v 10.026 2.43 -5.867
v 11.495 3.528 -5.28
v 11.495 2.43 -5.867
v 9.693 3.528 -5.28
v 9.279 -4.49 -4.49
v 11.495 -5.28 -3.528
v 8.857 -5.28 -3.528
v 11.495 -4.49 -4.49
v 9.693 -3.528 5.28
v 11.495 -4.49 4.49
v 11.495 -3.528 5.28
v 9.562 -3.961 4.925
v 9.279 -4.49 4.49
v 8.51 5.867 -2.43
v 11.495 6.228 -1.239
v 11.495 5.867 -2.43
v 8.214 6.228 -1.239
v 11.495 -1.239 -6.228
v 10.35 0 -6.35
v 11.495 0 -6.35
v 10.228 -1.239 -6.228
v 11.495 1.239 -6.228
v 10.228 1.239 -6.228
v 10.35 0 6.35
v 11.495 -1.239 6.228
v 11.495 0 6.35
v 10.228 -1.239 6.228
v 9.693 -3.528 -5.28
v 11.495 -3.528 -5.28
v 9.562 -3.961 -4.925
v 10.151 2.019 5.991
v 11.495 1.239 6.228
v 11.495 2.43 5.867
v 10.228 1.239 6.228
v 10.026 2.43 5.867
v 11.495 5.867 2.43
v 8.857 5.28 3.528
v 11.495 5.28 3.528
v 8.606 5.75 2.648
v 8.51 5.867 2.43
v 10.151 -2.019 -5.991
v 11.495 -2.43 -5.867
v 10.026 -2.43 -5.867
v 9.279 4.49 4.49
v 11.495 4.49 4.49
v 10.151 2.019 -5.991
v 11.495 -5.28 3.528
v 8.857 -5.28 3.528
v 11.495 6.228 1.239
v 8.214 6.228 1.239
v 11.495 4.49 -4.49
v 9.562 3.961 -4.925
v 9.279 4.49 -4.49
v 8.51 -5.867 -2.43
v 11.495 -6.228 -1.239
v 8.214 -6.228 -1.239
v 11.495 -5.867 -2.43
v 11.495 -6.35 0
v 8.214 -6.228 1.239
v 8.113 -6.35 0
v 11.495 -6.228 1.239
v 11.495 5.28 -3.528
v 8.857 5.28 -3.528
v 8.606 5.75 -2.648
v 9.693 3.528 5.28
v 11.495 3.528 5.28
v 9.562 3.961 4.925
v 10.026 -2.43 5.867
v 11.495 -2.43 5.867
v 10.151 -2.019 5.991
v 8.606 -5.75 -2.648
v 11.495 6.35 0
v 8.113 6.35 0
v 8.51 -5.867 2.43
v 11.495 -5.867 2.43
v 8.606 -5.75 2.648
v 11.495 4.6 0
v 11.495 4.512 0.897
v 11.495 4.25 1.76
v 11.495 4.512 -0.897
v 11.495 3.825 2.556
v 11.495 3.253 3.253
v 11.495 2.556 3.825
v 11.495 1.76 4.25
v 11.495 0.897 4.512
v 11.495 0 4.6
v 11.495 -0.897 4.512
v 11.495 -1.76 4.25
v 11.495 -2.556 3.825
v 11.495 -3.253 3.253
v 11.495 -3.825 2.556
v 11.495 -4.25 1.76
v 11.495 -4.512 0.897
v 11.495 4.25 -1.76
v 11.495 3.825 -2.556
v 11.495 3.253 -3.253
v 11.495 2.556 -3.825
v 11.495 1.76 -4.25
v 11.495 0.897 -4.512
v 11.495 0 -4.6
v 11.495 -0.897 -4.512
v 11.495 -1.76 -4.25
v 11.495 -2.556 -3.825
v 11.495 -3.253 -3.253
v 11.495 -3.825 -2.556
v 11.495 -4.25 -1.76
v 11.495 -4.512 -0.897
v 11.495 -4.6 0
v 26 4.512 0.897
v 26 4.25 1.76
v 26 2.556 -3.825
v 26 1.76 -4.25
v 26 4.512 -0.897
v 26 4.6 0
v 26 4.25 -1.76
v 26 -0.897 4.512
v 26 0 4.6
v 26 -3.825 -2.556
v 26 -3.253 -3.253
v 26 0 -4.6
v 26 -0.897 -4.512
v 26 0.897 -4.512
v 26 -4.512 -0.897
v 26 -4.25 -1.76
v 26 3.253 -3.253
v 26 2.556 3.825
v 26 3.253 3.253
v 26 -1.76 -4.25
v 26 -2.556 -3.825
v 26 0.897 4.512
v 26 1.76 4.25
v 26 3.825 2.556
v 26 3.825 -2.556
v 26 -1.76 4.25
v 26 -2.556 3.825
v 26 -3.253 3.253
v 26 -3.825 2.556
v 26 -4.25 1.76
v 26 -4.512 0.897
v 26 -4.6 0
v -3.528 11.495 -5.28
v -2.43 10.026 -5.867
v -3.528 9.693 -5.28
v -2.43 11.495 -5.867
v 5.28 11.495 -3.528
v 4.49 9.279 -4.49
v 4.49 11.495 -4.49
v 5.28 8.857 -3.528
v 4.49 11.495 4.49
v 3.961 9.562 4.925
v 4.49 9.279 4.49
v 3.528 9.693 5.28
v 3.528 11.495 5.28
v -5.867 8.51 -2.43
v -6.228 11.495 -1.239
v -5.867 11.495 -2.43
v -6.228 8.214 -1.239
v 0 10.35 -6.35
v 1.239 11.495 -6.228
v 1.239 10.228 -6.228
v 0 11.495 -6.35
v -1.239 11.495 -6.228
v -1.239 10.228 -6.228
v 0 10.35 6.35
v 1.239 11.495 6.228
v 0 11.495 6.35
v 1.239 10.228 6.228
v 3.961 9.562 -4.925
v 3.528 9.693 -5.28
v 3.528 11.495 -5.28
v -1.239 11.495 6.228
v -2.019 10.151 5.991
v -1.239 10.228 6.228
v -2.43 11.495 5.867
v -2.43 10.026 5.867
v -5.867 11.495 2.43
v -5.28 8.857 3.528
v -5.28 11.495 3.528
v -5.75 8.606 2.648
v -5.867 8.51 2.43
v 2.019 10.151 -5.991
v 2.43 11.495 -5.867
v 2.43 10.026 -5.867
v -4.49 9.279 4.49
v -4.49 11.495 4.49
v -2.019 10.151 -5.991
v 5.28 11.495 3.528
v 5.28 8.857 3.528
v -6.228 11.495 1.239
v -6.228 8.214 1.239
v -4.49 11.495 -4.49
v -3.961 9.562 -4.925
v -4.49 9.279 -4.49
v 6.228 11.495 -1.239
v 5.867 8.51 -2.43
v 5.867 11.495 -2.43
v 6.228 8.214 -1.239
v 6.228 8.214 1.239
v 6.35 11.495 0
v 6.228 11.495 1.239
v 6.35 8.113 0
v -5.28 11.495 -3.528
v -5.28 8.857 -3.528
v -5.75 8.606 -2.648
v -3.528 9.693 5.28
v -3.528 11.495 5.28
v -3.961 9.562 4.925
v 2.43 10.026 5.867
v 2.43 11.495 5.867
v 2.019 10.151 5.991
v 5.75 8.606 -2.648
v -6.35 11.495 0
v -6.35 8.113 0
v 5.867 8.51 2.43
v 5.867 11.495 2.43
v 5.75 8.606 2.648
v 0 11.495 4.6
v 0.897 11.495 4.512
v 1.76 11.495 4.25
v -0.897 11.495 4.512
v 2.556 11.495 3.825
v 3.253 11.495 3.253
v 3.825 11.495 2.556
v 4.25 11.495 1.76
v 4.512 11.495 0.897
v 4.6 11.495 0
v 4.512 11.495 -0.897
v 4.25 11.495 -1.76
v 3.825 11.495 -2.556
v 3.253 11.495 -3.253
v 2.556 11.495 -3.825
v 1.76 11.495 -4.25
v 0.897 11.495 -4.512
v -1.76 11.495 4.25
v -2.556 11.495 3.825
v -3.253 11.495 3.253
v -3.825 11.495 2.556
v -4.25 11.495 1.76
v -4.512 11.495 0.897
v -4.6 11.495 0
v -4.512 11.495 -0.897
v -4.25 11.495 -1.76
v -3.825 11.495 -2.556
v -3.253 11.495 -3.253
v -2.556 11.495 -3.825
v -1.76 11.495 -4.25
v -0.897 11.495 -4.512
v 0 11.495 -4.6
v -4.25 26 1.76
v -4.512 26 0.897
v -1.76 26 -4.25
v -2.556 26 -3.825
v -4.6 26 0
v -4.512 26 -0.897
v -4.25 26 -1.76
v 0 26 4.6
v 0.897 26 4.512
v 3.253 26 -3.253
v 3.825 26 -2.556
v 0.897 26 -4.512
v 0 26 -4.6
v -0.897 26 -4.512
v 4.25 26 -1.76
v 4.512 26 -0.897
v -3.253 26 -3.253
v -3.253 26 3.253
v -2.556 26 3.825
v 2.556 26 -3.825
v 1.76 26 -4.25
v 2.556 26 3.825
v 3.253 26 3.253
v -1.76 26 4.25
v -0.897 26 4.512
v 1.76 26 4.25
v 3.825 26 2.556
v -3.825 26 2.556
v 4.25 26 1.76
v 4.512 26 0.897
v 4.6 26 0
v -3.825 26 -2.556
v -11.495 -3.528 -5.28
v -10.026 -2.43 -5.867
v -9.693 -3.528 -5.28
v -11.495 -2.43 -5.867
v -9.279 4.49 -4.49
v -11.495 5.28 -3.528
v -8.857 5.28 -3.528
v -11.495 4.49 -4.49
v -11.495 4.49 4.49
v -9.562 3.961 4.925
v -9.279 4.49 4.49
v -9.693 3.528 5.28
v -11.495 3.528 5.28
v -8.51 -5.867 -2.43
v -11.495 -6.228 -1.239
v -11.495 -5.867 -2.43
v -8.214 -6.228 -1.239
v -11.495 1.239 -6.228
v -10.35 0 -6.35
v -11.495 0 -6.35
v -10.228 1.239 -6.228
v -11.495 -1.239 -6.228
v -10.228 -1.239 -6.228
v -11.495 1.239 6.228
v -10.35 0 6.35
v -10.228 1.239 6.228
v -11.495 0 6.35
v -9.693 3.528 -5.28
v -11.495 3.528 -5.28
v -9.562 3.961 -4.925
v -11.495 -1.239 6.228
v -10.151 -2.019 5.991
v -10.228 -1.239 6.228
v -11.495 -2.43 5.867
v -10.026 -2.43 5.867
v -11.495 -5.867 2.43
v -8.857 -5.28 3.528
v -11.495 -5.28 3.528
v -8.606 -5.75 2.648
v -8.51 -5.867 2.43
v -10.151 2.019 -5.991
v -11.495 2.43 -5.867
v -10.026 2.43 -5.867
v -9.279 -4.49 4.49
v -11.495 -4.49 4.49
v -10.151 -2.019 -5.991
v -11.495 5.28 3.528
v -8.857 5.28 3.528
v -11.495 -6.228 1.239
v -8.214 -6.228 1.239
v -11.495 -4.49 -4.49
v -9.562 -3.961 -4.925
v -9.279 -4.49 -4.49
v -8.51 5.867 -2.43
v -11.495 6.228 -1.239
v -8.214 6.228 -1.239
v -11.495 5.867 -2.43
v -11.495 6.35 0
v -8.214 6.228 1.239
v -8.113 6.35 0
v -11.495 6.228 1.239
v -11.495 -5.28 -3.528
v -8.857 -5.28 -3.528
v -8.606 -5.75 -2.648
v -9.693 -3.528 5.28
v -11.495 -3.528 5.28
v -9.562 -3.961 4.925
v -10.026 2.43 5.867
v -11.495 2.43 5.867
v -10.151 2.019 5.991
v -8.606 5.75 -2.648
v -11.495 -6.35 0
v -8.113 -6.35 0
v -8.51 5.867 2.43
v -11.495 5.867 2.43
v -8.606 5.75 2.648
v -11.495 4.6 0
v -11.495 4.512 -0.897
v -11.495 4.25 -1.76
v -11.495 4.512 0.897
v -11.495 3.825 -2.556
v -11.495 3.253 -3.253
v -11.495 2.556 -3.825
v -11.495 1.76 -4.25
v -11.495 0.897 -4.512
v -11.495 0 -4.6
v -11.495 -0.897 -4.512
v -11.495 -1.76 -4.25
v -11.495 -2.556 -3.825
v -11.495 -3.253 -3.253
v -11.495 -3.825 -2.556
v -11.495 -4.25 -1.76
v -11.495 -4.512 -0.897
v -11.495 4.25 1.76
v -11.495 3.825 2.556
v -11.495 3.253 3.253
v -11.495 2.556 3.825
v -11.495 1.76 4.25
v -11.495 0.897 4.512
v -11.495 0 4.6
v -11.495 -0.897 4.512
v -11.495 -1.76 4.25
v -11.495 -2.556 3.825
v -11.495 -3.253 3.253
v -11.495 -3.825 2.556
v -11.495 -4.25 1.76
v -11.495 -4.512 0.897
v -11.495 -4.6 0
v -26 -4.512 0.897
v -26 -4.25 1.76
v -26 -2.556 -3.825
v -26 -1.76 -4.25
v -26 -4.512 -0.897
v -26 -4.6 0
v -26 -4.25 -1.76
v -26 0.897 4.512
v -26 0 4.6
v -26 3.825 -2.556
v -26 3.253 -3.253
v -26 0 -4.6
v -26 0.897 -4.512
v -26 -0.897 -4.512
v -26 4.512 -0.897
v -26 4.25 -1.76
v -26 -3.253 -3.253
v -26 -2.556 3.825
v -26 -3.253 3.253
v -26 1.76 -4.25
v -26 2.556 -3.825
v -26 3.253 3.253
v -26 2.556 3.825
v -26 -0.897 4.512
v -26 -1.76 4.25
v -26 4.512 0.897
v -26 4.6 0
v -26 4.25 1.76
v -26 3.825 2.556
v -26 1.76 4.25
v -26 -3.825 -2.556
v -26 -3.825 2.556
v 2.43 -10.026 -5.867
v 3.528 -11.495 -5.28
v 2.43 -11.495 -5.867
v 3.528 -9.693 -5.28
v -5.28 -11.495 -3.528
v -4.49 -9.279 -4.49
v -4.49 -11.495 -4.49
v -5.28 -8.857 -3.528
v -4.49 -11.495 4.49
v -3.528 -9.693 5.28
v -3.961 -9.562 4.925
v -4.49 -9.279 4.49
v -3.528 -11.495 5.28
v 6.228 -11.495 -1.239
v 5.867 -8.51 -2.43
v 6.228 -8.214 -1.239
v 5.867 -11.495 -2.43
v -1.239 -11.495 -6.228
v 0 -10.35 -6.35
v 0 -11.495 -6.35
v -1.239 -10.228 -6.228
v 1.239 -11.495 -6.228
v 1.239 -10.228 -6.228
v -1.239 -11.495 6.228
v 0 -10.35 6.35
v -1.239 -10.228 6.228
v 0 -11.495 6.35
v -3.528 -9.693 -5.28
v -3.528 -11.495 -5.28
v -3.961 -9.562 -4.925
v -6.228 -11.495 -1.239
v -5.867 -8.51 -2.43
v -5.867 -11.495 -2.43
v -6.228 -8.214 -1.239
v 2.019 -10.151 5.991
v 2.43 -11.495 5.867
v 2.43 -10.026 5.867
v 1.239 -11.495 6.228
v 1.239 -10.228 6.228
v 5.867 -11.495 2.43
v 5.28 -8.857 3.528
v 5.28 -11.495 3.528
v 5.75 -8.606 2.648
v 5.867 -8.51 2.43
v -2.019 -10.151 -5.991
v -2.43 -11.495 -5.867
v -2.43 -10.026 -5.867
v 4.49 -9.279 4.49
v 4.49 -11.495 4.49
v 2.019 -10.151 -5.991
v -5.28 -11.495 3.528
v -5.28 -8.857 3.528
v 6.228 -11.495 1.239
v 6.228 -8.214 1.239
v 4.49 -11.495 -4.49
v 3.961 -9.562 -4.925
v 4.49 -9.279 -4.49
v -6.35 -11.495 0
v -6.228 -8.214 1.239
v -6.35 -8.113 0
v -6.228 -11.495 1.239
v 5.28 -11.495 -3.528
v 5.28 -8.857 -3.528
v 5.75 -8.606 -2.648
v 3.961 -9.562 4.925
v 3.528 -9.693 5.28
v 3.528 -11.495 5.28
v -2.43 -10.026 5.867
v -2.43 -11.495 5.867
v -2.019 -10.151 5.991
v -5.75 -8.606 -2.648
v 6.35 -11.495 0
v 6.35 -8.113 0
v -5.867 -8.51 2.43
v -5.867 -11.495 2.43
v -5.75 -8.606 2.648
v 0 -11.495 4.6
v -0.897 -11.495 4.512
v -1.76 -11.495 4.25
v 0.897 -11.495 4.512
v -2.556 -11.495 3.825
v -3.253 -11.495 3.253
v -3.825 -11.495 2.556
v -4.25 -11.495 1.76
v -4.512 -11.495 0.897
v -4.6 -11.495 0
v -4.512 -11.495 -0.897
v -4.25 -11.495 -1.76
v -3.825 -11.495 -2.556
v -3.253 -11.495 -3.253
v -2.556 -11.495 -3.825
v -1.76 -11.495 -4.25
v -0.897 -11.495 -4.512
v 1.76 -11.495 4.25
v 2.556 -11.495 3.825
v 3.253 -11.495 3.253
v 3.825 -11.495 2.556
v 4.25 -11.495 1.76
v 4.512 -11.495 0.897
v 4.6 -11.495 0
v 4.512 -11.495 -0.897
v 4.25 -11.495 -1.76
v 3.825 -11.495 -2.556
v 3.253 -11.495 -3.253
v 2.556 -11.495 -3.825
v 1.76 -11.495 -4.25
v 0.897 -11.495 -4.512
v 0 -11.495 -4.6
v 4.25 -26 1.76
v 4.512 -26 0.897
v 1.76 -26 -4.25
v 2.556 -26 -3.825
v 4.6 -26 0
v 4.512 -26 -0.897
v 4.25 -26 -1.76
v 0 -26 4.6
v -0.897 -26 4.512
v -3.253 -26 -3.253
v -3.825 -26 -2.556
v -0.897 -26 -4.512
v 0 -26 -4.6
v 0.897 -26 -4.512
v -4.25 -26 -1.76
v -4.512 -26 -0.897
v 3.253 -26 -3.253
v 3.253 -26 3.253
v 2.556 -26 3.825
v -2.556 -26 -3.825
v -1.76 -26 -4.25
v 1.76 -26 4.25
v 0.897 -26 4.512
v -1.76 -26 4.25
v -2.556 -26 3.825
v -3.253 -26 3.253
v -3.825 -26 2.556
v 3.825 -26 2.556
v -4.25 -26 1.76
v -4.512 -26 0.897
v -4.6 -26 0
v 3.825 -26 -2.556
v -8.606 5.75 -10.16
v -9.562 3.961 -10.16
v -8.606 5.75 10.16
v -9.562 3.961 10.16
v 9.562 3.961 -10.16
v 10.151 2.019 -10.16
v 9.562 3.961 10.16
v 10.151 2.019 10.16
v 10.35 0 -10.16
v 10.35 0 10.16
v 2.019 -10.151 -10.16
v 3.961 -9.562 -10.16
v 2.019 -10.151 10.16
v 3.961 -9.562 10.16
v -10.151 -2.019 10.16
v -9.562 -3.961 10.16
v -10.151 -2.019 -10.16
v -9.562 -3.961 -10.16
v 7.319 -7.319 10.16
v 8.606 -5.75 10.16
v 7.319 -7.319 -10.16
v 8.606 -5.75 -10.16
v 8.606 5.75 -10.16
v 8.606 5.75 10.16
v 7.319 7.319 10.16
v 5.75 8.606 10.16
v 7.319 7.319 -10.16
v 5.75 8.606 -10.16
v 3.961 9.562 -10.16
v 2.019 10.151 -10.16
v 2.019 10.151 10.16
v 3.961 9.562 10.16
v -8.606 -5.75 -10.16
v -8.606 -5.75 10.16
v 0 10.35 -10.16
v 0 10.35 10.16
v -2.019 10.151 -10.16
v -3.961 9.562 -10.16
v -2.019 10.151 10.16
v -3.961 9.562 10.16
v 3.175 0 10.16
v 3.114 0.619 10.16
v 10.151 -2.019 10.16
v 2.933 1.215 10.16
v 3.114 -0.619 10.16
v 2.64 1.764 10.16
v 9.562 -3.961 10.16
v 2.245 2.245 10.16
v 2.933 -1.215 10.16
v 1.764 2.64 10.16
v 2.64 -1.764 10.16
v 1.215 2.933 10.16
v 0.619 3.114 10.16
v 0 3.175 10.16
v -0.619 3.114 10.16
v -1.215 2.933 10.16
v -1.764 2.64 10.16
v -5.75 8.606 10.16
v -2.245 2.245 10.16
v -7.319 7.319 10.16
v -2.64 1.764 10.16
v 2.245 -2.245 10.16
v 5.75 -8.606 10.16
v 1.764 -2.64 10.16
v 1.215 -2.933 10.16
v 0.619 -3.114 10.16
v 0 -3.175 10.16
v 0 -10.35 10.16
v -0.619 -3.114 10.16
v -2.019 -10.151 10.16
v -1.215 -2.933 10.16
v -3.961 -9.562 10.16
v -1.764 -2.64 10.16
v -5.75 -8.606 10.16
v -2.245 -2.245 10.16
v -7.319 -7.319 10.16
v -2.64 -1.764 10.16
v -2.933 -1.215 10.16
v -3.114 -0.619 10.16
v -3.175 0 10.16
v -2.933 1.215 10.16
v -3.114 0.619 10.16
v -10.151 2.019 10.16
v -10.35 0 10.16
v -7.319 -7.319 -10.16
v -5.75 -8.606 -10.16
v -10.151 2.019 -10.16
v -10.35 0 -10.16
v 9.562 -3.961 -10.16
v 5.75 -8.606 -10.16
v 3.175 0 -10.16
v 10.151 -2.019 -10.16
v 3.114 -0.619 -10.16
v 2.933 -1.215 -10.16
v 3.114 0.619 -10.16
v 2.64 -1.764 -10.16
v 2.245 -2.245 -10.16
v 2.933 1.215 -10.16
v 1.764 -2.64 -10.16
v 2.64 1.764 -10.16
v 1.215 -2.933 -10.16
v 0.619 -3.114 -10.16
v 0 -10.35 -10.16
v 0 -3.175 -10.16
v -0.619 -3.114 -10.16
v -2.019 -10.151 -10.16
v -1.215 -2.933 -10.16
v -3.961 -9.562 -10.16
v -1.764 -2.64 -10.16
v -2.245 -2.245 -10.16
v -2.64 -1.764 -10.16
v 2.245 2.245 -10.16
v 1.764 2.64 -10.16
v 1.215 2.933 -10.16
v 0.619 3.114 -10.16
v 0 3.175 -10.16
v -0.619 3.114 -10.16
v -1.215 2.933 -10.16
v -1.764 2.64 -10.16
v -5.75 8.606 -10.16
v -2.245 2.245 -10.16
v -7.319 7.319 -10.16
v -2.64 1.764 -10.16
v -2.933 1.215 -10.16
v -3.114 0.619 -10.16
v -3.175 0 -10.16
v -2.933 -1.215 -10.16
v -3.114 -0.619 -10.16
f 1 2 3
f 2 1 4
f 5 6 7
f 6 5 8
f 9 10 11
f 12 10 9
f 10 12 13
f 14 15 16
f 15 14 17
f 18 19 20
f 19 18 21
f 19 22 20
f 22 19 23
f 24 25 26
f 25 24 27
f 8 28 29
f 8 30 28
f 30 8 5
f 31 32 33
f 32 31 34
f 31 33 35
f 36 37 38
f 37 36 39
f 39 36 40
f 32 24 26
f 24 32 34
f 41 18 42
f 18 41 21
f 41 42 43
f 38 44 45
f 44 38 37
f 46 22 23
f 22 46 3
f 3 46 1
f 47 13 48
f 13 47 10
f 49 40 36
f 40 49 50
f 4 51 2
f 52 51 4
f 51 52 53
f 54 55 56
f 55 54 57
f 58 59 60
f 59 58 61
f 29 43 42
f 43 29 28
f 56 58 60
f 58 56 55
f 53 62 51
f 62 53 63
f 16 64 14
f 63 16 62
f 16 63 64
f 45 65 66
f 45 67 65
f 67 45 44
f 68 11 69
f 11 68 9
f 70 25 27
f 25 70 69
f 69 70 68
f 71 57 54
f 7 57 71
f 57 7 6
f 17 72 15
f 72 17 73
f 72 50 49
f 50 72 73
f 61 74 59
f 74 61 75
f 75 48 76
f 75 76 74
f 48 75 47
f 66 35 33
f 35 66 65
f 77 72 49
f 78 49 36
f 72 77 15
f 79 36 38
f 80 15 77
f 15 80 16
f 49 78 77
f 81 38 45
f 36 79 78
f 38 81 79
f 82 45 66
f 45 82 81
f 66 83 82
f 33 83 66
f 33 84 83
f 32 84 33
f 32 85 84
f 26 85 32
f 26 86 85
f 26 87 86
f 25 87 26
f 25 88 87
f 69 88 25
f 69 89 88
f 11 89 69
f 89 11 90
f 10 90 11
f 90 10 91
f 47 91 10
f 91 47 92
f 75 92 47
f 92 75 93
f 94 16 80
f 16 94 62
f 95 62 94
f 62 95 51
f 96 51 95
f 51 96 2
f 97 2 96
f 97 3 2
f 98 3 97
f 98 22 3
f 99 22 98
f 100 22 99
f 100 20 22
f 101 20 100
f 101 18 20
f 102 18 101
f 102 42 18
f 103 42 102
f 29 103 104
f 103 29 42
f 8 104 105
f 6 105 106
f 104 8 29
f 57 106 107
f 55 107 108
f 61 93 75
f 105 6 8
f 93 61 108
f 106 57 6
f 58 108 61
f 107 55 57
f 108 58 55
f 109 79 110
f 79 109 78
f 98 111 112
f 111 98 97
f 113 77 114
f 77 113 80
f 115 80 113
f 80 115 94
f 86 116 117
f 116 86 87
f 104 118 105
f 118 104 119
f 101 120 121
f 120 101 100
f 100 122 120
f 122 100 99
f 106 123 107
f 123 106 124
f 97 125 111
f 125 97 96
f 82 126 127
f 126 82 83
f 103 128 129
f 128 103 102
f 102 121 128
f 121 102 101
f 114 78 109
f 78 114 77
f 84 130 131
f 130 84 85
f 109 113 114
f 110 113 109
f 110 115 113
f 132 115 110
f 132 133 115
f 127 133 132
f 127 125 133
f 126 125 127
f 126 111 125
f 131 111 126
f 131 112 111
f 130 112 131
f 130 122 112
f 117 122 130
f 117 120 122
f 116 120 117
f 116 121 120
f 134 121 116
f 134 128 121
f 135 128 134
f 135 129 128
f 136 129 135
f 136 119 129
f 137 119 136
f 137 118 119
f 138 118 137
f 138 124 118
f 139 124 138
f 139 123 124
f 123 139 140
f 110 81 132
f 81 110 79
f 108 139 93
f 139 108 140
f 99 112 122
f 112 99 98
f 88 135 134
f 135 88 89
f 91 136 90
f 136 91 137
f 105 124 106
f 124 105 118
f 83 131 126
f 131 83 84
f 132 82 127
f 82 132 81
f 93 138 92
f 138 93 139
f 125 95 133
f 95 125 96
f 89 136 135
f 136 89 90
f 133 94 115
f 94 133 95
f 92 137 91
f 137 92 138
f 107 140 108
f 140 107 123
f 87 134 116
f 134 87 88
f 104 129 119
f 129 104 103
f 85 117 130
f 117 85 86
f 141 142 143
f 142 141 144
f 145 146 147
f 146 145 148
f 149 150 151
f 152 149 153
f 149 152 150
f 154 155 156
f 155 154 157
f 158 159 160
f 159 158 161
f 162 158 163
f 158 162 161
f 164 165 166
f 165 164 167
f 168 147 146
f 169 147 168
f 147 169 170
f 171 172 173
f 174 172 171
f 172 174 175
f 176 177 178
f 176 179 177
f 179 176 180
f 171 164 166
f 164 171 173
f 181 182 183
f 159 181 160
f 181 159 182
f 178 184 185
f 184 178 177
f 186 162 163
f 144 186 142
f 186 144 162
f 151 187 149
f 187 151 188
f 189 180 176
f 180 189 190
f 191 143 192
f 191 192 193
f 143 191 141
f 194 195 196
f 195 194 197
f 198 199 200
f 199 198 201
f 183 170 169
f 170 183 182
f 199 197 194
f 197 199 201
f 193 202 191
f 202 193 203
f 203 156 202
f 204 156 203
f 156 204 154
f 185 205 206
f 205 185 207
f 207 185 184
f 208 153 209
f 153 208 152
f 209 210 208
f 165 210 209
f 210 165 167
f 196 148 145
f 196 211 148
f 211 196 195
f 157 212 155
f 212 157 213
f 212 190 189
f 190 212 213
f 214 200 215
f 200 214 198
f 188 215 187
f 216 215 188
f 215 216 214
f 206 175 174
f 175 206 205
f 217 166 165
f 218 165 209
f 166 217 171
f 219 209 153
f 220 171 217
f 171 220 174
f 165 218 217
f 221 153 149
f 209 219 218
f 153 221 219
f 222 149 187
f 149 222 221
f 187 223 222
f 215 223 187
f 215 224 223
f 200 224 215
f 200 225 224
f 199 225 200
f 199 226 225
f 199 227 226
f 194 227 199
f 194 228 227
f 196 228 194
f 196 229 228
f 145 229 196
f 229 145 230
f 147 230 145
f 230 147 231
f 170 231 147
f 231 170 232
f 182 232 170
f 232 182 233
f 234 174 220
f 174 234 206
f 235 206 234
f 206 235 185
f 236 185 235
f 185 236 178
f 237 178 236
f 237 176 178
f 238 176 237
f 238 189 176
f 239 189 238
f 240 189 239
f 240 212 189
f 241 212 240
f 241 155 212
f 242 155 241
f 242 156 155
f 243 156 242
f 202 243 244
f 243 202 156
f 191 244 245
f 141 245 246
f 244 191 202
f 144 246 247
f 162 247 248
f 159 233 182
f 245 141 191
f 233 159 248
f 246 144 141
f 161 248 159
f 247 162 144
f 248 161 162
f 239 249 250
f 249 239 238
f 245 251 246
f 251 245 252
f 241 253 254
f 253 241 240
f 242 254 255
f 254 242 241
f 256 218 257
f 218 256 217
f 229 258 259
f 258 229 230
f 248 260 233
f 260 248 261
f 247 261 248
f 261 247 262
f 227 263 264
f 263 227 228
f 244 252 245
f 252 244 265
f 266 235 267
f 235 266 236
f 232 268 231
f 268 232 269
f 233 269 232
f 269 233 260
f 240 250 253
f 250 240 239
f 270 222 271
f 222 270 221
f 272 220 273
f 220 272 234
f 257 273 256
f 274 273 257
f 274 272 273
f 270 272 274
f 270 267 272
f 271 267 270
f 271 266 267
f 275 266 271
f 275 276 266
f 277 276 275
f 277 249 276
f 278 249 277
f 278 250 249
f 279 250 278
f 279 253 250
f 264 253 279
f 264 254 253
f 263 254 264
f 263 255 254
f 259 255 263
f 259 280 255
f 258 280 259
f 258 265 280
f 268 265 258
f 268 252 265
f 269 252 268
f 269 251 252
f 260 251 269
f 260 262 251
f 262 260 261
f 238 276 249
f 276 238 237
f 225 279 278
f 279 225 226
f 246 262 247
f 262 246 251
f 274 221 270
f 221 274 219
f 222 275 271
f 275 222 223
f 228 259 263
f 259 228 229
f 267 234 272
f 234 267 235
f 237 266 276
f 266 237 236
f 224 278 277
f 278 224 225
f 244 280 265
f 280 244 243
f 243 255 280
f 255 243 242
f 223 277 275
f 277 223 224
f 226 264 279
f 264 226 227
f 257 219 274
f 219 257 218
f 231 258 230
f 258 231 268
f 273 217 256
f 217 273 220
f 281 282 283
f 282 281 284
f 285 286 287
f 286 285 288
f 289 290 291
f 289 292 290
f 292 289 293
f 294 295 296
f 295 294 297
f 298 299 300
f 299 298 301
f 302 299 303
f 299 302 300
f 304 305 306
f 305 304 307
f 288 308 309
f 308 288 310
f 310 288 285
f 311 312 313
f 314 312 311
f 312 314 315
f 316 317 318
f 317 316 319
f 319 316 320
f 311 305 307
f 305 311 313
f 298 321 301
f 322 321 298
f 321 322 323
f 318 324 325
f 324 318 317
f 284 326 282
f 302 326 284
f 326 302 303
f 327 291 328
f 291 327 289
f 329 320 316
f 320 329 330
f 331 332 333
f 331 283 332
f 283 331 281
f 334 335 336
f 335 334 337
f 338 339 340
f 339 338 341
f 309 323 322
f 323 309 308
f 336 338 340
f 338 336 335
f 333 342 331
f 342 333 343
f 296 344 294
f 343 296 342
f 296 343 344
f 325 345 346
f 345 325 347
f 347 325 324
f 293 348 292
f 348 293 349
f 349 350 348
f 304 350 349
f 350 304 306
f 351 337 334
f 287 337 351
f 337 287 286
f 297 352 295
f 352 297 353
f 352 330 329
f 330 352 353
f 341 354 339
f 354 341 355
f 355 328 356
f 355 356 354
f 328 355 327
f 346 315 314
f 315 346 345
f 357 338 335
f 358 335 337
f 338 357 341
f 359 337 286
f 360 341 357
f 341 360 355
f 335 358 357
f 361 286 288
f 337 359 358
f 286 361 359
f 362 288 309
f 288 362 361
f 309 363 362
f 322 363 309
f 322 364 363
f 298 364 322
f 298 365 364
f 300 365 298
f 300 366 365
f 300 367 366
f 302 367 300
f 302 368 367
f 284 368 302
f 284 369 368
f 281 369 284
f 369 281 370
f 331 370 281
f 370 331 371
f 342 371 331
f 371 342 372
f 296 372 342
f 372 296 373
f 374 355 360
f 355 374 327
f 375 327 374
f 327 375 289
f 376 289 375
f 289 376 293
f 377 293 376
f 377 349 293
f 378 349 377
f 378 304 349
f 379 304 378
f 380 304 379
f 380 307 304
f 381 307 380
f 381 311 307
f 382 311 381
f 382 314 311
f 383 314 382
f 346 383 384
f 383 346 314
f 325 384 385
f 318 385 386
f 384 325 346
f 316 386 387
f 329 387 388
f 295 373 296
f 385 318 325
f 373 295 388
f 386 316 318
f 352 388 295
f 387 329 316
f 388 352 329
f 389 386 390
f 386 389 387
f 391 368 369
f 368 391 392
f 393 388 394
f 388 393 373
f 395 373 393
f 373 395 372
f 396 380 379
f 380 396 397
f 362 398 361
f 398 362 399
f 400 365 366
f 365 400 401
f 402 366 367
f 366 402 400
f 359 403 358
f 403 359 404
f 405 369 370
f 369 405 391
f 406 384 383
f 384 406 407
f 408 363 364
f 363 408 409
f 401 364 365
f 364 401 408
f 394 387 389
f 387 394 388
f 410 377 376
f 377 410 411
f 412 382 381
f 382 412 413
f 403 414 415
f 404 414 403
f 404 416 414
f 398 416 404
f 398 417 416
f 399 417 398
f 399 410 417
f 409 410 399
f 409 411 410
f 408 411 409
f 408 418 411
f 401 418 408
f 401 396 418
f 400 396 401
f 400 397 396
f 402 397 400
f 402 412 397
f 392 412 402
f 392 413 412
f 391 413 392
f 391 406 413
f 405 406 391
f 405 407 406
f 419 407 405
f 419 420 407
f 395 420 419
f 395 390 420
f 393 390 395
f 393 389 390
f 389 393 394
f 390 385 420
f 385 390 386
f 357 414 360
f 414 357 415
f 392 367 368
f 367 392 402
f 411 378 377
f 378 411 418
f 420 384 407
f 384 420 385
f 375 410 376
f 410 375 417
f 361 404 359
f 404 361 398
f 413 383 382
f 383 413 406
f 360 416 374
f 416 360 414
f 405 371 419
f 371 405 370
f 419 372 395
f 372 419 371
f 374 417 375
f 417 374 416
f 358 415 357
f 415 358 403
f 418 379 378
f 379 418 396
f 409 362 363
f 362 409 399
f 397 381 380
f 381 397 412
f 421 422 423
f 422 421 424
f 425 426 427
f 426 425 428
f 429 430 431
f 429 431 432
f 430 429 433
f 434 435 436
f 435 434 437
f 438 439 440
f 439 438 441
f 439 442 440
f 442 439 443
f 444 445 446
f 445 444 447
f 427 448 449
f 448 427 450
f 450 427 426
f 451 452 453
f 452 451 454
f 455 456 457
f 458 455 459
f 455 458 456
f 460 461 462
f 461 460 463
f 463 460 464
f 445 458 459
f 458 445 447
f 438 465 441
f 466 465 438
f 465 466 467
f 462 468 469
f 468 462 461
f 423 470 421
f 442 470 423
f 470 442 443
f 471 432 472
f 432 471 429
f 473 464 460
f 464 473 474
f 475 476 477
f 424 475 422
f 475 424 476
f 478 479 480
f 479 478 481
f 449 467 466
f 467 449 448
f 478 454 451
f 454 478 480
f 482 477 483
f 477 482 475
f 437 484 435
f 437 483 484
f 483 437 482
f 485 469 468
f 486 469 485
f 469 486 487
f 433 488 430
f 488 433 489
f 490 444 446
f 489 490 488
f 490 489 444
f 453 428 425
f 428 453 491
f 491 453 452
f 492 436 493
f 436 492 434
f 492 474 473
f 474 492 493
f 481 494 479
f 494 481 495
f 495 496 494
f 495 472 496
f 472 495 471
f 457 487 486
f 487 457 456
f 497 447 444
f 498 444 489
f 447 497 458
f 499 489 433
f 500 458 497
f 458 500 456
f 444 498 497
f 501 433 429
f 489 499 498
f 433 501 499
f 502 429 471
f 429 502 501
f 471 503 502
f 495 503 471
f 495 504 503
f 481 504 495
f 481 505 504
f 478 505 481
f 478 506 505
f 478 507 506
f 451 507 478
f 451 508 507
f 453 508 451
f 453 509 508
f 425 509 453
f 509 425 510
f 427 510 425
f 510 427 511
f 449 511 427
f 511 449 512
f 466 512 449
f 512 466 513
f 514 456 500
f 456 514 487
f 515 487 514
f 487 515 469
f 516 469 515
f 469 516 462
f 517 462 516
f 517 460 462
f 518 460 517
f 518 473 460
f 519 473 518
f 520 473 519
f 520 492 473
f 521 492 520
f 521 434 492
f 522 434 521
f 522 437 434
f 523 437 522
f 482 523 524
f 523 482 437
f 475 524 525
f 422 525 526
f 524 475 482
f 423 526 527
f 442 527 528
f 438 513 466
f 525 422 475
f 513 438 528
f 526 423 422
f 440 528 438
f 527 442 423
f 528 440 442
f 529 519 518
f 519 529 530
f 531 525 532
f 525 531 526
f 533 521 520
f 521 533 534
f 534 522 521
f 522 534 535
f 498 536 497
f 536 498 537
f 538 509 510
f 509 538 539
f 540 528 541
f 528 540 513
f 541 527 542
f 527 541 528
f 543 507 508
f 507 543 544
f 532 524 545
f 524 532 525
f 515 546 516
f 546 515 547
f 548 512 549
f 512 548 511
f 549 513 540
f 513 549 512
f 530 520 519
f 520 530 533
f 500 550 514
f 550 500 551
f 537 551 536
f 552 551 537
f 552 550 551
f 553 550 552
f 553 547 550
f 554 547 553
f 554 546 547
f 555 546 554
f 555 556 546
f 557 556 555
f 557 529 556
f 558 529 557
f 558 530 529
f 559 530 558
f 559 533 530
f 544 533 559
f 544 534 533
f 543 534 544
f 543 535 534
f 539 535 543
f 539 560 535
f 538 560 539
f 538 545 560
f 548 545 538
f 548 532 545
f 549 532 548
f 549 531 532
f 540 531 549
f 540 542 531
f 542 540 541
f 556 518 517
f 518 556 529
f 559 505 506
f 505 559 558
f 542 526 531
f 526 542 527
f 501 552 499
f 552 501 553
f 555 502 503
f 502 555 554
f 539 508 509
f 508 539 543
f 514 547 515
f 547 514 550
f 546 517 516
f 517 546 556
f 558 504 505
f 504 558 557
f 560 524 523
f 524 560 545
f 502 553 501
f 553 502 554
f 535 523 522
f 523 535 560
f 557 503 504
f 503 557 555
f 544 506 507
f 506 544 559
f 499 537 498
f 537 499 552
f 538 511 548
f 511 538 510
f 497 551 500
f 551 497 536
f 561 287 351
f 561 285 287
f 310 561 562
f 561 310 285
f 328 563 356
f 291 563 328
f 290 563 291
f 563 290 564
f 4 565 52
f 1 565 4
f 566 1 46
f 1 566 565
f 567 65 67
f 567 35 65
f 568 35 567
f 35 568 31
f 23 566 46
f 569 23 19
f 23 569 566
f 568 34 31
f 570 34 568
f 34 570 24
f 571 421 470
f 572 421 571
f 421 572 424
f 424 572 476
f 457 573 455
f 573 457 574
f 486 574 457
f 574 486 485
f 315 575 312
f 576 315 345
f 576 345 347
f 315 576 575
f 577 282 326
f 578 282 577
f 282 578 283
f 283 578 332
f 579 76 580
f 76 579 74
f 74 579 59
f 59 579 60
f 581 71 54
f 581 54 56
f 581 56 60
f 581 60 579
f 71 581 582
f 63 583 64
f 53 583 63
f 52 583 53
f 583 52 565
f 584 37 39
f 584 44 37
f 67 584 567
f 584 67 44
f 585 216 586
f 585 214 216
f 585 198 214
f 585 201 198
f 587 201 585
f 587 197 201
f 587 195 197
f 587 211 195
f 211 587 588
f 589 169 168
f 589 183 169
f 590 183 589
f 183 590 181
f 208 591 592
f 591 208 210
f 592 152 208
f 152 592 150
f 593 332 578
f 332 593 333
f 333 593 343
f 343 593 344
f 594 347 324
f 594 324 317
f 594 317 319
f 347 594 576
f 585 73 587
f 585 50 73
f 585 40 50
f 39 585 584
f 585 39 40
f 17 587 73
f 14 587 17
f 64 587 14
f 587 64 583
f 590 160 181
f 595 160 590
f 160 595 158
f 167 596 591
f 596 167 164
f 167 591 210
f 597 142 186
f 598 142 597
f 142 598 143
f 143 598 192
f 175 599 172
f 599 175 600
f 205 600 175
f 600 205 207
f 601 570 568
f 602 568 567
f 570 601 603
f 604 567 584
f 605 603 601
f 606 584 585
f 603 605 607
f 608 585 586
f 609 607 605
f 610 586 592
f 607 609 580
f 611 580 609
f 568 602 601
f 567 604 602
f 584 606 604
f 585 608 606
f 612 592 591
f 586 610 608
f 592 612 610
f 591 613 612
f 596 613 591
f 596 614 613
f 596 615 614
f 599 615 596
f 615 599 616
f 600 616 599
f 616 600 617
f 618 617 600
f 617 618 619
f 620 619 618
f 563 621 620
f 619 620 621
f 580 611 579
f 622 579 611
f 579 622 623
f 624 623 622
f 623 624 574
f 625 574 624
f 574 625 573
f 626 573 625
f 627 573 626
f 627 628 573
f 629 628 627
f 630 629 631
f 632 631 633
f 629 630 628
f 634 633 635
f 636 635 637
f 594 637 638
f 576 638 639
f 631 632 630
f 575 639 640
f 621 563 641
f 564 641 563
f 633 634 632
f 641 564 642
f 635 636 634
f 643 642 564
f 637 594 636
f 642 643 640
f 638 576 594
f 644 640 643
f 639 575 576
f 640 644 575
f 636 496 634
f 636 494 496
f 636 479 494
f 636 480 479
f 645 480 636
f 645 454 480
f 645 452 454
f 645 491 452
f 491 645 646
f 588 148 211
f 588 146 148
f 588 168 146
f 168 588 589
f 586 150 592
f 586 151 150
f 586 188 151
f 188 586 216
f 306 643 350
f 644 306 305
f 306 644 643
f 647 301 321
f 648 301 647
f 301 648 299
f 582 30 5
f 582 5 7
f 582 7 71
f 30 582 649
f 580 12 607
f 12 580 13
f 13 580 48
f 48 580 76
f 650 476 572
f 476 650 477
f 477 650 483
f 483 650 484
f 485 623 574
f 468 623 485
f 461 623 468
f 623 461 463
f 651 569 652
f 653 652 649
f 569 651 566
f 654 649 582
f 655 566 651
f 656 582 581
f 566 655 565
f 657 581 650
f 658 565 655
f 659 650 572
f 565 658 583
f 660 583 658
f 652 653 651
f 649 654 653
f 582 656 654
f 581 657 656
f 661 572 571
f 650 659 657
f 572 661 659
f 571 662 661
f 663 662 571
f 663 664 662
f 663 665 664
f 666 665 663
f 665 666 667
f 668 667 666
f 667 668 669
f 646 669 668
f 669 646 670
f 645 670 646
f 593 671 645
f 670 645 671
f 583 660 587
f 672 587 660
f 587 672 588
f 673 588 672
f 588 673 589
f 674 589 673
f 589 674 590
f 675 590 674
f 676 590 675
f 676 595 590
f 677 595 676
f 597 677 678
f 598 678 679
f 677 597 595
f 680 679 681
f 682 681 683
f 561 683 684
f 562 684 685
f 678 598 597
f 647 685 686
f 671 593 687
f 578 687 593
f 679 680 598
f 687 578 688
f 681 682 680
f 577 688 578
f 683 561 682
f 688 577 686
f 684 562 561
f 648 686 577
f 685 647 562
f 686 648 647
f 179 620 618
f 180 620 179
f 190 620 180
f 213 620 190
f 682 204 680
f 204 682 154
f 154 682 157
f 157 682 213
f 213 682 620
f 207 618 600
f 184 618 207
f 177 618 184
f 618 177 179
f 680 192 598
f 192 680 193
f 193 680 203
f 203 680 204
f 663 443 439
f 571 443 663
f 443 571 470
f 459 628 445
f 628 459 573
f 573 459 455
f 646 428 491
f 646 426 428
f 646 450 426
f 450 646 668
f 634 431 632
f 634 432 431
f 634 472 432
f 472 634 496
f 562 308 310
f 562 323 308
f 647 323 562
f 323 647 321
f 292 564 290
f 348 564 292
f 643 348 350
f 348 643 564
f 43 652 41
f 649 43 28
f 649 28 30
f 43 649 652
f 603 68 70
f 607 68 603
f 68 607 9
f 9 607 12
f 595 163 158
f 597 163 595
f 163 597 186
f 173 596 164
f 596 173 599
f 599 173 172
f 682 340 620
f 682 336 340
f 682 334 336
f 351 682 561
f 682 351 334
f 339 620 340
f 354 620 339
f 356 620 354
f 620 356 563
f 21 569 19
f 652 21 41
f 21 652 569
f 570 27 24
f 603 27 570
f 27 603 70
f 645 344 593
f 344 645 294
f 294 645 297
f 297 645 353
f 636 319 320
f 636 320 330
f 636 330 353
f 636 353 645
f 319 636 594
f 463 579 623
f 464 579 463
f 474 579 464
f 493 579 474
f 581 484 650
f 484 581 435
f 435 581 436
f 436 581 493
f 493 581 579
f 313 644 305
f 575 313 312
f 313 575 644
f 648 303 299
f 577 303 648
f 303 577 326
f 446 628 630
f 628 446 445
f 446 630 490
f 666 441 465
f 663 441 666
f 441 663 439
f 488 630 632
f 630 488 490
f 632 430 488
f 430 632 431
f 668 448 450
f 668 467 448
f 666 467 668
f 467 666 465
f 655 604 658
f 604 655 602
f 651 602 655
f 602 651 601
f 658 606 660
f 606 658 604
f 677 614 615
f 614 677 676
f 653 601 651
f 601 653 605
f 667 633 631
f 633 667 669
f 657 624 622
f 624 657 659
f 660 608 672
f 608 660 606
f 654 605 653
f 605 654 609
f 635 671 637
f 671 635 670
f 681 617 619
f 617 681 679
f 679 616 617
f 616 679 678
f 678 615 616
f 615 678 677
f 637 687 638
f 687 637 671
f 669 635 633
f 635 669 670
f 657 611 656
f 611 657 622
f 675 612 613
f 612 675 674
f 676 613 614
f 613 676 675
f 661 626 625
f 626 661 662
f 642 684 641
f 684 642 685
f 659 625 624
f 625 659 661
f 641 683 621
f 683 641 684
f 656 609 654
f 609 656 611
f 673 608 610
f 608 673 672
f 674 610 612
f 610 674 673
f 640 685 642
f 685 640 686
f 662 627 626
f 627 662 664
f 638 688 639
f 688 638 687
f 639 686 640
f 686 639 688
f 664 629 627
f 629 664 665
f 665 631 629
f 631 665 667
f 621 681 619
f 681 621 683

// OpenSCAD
$fn = 32;

// ----------------------------------------------------------------------
// Cardan cross: 52 mm span, 12.7 mm trunnions
// ----------------------------------------------------------------------

// --- parameters (mm) ---
journal_d = 12.7;         // trunnion diameter
arm_len = 26;             // trunnion length from the centre
step_r = 4.32;            // step position from the centre
step_d = 9.2;             // journal diameter after the step
hub_d = 20.7;             // hub diameter
hub_h = 20.32;            // hub height
bore_d = 6.35;            // hub bore

difference() {
  union() {
    /* hub along the joint axis */
    cylinder(h = hub_h, d = hub_d, center = true);
    for (a = [0 : 90 : 270]) rotate([0, 0, a]) {
      /* trunnion, sunk into the hub */
      translate([hub_d / 4, 0, 0]) rotate([0, 90, 0]) cylinder(h = step_r + 2, d = journal_d);
      /* stepped journal out to the tip */
      translate([step_r - 0.5, 0, 0]) rotate([0, 90, 0]) cylinder(h = arm_len + 0.5 - step_r, d = step_d);
    }
  }
  /* lubrication bore through the hub, 2.5 mm clear on both sides */
  translate([0, 0, -hub_h / 2 - 2.5]) cylinder(h = hub_h + 5, d = bore_d);
}
